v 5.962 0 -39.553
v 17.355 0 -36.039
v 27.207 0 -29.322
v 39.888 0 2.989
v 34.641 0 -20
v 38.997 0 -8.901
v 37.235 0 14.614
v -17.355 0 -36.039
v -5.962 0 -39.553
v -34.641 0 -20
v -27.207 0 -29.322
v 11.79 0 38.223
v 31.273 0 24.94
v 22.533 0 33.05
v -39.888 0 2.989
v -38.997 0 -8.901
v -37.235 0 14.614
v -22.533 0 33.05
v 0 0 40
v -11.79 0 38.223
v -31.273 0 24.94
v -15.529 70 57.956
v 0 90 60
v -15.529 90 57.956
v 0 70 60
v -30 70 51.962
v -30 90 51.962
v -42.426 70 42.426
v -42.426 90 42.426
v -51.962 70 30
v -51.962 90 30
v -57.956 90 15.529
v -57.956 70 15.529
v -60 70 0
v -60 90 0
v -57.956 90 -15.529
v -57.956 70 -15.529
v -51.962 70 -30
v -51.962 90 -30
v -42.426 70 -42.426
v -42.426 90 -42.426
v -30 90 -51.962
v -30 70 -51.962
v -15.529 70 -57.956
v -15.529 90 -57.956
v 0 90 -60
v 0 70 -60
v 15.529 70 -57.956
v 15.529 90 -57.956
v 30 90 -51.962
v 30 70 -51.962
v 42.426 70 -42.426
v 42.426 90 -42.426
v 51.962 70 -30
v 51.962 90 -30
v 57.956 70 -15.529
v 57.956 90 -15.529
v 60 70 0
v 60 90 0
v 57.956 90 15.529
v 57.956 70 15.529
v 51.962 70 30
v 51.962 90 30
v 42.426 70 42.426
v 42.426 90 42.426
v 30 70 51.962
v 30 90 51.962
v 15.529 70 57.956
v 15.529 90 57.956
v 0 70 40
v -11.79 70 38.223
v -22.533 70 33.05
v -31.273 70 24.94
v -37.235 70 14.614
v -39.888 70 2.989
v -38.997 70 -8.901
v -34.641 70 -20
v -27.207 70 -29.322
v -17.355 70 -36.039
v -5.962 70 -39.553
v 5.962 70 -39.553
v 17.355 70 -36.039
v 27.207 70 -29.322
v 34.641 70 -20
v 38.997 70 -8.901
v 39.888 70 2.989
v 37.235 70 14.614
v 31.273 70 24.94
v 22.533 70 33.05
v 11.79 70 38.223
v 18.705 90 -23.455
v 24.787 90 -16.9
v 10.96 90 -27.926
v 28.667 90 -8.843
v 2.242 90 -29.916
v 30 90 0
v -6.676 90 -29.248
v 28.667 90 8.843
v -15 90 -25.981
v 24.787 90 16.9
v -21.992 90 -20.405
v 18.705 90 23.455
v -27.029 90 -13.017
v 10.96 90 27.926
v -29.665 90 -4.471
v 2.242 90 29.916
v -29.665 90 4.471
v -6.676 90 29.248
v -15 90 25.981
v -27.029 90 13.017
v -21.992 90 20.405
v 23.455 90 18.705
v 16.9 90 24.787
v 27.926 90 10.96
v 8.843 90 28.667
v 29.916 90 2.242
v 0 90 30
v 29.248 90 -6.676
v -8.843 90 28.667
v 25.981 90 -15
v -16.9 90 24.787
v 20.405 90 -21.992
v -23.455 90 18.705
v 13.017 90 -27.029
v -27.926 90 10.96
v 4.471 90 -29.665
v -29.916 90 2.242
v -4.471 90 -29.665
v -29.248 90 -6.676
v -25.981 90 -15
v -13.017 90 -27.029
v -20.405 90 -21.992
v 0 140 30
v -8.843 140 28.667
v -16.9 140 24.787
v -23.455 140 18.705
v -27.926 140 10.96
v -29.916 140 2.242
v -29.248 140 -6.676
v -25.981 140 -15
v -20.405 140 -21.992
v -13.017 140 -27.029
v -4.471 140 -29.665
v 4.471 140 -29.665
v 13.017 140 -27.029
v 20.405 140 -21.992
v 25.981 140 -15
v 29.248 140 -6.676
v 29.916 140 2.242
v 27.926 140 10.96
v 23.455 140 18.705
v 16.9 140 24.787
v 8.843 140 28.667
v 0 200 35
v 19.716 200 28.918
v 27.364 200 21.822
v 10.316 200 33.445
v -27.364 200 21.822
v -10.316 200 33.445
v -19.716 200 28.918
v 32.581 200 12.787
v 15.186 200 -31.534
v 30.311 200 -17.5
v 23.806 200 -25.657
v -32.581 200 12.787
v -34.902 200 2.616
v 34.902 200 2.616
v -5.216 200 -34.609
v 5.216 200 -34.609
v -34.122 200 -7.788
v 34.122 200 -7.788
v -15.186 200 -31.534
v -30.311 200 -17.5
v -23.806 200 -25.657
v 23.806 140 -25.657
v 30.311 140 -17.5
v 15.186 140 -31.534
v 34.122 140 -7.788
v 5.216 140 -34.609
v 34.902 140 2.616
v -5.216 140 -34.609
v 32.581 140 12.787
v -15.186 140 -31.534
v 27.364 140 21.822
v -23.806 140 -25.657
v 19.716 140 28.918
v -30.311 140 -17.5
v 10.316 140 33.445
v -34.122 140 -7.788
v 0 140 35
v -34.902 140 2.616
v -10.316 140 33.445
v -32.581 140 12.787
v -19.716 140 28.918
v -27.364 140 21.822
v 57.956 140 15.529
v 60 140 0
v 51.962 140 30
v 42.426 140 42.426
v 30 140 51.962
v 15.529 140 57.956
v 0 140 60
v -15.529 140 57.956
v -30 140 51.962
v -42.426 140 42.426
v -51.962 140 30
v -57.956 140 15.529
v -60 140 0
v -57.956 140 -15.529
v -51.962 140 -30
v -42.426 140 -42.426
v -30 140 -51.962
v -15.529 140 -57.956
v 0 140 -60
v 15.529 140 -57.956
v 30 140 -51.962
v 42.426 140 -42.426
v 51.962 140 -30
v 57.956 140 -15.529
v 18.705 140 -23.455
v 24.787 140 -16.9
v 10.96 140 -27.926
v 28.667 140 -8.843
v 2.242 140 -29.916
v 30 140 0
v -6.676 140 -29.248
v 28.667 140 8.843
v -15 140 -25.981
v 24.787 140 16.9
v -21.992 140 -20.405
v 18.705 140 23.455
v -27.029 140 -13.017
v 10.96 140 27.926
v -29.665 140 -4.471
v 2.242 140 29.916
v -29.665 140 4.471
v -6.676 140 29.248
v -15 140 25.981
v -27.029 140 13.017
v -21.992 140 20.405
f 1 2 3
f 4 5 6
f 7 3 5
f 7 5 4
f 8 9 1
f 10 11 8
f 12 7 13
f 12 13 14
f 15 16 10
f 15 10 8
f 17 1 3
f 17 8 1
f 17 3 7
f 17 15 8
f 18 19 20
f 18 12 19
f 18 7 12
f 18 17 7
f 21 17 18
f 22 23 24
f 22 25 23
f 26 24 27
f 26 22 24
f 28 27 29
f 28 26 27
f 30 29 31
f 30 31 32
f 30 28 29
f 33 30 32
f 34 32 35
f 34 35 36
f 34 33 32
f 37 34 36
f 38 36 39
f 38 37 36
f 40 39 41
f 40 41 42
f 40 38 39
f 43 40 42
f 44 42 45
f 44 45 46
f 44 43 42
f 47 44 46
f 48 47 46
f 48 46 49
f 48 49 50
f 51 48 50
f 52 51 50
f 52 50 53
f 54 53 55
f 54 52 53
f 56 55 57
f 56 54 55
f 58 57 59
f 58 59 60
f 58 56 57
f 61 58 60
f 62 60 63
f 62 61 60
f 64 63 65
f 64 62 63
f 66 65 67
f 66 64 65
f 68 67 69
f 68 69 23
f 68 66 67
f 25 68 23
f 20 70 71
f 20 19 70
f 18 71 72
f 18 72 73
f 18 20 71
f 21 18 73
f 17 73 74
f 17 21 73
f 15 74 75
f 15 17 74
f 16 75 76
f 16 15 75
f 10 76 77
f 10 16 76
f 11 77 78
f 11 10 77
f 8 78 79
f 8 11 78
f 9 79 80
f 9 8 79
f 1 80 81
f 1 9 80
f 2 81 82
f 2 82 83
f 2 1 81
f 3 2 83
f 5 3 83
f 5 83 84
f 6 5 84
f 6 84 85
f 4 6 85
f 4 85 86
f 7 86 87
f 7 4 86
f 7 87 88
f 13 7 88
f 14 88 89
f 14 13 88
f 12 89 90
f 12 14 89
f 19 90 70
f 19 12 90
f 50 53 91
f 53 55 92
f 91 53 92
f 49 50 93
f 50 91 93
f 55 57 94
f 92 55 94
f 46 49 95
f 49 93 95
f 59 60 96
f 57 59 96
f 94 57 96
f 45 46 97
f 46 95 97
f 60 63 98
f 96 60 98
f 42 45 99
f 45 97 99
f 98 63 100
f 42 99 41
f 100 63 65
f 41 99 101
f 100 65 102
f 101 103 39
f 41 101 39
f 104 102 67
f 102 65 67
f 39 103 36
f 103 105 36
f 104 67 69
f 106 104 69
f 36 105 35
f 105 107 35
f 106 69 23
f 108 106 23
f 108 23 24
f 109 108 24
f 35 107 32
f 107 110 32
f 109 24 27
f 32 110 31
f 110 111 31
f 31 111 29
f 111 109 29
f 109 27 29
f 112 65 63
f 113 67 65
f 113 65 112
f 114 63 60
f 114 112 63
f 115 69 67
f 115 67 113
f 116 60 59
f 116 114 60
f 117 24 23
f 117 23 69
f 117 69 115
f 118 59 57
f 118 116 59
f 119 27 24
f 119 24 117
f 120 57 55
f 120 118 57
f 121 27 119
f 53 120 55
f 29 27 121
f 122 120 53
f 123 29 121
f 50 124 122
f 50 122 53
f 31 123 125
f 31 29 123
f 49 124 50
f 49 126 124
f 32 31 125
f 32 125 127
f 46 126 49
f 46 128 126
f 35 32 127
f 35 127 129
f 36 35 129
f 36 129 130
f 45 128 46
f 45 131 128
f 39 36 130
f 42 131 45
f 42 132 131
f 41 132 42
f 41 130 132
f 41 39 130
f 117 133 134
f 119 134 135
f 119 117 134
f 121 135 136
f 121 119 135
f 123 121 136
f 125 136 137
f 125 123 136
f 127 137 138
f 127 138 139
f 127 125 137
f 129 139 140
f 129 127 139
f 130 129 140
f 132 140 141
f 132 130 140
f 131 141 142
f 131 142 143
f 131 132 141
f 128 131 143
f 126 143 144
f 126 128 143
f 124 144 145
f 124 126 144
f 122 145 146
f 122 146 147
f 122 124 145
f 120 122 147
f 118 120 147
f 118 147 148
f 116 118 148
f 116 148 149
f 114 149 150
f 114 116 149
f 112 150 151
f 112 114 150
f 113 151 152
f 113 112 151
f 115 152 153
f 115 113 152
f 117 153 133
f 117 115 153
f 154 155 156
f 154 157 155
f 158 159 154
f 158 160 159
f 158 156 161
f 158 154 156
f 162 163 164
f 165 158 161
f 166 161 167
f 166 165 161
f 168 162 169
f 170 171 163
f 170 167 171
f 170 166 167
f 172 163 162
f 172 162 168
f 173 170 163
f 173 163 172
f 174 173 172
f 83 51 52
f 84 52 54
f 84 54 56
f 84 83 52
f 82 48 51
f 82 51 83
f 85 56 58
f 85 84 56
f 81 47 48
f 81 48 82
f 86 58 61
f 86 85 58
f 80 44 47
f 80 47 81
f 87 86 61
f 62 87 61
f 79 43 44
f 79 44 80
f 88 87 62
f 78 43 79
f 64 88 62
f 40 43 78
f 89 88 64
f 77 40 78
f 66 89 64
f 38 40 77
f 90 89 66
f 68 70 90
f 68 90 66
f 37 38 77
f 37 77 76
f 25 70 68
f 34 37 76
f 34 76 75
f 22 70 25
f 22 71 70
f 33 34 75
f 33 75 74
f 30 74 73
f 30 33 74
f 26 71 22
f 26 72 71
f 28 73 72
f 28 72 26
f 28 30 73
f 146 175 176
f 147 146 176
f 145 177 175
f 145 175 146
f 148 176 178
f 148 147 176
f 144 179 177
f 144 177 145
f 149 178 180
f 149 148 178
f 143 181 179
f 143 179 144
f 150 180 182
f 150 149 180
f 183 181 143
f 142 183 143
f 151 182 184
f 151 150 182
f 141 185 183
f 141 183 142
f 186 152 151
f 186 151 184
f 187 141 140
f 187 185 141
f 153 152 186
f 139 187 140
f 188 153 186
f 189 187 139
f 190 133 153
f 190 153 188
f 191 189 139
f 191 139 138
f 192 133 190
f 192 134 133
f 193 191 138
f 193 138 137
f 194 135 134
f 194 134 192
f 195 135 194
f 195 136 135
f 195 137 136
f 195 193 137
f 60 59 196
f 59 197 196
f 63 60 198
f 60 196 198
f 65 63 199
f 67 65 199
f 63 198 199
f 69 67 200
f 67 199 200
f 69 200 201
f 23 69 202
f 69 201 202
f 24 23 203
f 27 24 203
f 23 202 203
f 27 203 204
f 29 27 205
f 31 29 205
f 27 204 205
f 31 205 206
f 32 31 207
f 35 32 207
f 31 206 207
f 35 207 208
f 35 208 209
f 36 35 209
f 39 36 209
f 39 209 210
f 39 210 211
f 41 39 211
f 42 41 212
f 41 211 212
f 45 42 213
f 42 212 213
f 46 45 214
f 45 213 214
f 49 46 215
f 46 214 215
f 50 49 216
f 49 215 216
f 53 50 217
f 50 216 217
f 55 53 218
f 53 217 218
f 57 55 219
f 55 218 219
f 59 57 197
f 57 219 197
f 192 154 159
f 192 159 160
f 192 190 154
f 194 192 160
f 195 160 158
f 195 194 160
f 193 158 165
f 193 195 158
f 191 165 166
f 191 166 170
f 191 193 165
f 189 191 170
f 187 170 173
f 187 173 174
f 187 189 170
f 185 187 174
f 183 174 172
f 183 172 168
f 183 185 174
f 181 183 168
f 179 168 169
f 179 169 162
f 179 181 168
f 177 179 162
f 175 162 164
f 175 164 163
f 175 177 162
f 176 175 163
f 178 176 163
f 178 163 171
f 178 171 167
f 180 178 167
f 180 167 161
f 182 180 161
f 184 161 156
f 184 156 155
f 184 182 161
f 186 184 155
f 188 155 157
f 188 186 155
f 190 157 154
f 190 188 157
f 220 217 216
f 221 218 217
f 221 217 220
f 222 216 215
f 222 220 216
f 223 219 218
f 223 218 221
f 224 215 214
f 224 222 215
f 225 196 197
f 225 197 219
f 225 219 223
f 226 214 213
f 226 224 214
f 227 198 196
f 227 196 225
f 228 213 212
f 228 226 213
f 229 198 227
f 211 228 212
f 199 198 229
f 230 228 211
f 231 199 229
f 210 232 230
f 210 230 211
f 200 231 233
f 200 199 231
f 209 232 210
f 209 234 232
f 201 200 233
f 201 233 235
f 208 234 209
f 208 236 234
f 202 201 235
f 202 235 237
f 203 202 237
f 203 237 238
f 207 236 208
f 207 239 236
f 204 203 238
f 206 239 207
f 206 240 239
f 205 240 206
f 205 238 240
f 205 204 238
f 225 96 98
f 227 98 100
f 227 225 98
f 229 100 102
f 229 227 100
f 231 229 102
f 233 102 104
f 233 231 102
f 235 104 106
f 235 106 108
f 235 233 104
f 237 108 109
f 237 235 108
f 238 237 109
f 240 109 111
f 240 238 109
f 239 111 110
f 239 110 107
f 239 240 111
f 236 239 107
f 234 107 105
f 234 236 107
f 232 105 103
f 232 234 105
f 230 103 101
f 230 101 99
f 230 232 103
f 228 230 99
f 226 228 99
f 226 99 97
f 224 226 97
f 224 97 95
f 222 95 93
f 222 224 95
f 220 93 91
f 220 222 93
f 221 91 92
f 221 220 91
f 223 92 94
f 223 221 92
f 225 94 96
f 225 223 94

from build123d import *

# Parameters (mm, degrees)
F2_W = 30
F2_H = 50


with BuildPart() as f1:
    # F0 (on Right) → F1 (revolve)
    with BuildSketch(Plane.YZ):
        Polygon((0, 40), (0, 0), (200, 0), (200, 35), (140, 35), (140, 30), (90, 30), (90, 60), (70, 60), (70, 40), align=None)
    revolve(axis=Axis((0, 100, 0), (0, -1, 0)))


with BuildPart() as f3:
    # F2 (on Top) → F3 (revolve)
    with BuildSketch(Plane.XY):
        with Locations((45, 115)):
            Rectangle(F2_W, F2_H)
    revolve(axis=Axis((0, 140, 0), (0, -1, 0)))


solid = Compound([f1.part, f3.part])
